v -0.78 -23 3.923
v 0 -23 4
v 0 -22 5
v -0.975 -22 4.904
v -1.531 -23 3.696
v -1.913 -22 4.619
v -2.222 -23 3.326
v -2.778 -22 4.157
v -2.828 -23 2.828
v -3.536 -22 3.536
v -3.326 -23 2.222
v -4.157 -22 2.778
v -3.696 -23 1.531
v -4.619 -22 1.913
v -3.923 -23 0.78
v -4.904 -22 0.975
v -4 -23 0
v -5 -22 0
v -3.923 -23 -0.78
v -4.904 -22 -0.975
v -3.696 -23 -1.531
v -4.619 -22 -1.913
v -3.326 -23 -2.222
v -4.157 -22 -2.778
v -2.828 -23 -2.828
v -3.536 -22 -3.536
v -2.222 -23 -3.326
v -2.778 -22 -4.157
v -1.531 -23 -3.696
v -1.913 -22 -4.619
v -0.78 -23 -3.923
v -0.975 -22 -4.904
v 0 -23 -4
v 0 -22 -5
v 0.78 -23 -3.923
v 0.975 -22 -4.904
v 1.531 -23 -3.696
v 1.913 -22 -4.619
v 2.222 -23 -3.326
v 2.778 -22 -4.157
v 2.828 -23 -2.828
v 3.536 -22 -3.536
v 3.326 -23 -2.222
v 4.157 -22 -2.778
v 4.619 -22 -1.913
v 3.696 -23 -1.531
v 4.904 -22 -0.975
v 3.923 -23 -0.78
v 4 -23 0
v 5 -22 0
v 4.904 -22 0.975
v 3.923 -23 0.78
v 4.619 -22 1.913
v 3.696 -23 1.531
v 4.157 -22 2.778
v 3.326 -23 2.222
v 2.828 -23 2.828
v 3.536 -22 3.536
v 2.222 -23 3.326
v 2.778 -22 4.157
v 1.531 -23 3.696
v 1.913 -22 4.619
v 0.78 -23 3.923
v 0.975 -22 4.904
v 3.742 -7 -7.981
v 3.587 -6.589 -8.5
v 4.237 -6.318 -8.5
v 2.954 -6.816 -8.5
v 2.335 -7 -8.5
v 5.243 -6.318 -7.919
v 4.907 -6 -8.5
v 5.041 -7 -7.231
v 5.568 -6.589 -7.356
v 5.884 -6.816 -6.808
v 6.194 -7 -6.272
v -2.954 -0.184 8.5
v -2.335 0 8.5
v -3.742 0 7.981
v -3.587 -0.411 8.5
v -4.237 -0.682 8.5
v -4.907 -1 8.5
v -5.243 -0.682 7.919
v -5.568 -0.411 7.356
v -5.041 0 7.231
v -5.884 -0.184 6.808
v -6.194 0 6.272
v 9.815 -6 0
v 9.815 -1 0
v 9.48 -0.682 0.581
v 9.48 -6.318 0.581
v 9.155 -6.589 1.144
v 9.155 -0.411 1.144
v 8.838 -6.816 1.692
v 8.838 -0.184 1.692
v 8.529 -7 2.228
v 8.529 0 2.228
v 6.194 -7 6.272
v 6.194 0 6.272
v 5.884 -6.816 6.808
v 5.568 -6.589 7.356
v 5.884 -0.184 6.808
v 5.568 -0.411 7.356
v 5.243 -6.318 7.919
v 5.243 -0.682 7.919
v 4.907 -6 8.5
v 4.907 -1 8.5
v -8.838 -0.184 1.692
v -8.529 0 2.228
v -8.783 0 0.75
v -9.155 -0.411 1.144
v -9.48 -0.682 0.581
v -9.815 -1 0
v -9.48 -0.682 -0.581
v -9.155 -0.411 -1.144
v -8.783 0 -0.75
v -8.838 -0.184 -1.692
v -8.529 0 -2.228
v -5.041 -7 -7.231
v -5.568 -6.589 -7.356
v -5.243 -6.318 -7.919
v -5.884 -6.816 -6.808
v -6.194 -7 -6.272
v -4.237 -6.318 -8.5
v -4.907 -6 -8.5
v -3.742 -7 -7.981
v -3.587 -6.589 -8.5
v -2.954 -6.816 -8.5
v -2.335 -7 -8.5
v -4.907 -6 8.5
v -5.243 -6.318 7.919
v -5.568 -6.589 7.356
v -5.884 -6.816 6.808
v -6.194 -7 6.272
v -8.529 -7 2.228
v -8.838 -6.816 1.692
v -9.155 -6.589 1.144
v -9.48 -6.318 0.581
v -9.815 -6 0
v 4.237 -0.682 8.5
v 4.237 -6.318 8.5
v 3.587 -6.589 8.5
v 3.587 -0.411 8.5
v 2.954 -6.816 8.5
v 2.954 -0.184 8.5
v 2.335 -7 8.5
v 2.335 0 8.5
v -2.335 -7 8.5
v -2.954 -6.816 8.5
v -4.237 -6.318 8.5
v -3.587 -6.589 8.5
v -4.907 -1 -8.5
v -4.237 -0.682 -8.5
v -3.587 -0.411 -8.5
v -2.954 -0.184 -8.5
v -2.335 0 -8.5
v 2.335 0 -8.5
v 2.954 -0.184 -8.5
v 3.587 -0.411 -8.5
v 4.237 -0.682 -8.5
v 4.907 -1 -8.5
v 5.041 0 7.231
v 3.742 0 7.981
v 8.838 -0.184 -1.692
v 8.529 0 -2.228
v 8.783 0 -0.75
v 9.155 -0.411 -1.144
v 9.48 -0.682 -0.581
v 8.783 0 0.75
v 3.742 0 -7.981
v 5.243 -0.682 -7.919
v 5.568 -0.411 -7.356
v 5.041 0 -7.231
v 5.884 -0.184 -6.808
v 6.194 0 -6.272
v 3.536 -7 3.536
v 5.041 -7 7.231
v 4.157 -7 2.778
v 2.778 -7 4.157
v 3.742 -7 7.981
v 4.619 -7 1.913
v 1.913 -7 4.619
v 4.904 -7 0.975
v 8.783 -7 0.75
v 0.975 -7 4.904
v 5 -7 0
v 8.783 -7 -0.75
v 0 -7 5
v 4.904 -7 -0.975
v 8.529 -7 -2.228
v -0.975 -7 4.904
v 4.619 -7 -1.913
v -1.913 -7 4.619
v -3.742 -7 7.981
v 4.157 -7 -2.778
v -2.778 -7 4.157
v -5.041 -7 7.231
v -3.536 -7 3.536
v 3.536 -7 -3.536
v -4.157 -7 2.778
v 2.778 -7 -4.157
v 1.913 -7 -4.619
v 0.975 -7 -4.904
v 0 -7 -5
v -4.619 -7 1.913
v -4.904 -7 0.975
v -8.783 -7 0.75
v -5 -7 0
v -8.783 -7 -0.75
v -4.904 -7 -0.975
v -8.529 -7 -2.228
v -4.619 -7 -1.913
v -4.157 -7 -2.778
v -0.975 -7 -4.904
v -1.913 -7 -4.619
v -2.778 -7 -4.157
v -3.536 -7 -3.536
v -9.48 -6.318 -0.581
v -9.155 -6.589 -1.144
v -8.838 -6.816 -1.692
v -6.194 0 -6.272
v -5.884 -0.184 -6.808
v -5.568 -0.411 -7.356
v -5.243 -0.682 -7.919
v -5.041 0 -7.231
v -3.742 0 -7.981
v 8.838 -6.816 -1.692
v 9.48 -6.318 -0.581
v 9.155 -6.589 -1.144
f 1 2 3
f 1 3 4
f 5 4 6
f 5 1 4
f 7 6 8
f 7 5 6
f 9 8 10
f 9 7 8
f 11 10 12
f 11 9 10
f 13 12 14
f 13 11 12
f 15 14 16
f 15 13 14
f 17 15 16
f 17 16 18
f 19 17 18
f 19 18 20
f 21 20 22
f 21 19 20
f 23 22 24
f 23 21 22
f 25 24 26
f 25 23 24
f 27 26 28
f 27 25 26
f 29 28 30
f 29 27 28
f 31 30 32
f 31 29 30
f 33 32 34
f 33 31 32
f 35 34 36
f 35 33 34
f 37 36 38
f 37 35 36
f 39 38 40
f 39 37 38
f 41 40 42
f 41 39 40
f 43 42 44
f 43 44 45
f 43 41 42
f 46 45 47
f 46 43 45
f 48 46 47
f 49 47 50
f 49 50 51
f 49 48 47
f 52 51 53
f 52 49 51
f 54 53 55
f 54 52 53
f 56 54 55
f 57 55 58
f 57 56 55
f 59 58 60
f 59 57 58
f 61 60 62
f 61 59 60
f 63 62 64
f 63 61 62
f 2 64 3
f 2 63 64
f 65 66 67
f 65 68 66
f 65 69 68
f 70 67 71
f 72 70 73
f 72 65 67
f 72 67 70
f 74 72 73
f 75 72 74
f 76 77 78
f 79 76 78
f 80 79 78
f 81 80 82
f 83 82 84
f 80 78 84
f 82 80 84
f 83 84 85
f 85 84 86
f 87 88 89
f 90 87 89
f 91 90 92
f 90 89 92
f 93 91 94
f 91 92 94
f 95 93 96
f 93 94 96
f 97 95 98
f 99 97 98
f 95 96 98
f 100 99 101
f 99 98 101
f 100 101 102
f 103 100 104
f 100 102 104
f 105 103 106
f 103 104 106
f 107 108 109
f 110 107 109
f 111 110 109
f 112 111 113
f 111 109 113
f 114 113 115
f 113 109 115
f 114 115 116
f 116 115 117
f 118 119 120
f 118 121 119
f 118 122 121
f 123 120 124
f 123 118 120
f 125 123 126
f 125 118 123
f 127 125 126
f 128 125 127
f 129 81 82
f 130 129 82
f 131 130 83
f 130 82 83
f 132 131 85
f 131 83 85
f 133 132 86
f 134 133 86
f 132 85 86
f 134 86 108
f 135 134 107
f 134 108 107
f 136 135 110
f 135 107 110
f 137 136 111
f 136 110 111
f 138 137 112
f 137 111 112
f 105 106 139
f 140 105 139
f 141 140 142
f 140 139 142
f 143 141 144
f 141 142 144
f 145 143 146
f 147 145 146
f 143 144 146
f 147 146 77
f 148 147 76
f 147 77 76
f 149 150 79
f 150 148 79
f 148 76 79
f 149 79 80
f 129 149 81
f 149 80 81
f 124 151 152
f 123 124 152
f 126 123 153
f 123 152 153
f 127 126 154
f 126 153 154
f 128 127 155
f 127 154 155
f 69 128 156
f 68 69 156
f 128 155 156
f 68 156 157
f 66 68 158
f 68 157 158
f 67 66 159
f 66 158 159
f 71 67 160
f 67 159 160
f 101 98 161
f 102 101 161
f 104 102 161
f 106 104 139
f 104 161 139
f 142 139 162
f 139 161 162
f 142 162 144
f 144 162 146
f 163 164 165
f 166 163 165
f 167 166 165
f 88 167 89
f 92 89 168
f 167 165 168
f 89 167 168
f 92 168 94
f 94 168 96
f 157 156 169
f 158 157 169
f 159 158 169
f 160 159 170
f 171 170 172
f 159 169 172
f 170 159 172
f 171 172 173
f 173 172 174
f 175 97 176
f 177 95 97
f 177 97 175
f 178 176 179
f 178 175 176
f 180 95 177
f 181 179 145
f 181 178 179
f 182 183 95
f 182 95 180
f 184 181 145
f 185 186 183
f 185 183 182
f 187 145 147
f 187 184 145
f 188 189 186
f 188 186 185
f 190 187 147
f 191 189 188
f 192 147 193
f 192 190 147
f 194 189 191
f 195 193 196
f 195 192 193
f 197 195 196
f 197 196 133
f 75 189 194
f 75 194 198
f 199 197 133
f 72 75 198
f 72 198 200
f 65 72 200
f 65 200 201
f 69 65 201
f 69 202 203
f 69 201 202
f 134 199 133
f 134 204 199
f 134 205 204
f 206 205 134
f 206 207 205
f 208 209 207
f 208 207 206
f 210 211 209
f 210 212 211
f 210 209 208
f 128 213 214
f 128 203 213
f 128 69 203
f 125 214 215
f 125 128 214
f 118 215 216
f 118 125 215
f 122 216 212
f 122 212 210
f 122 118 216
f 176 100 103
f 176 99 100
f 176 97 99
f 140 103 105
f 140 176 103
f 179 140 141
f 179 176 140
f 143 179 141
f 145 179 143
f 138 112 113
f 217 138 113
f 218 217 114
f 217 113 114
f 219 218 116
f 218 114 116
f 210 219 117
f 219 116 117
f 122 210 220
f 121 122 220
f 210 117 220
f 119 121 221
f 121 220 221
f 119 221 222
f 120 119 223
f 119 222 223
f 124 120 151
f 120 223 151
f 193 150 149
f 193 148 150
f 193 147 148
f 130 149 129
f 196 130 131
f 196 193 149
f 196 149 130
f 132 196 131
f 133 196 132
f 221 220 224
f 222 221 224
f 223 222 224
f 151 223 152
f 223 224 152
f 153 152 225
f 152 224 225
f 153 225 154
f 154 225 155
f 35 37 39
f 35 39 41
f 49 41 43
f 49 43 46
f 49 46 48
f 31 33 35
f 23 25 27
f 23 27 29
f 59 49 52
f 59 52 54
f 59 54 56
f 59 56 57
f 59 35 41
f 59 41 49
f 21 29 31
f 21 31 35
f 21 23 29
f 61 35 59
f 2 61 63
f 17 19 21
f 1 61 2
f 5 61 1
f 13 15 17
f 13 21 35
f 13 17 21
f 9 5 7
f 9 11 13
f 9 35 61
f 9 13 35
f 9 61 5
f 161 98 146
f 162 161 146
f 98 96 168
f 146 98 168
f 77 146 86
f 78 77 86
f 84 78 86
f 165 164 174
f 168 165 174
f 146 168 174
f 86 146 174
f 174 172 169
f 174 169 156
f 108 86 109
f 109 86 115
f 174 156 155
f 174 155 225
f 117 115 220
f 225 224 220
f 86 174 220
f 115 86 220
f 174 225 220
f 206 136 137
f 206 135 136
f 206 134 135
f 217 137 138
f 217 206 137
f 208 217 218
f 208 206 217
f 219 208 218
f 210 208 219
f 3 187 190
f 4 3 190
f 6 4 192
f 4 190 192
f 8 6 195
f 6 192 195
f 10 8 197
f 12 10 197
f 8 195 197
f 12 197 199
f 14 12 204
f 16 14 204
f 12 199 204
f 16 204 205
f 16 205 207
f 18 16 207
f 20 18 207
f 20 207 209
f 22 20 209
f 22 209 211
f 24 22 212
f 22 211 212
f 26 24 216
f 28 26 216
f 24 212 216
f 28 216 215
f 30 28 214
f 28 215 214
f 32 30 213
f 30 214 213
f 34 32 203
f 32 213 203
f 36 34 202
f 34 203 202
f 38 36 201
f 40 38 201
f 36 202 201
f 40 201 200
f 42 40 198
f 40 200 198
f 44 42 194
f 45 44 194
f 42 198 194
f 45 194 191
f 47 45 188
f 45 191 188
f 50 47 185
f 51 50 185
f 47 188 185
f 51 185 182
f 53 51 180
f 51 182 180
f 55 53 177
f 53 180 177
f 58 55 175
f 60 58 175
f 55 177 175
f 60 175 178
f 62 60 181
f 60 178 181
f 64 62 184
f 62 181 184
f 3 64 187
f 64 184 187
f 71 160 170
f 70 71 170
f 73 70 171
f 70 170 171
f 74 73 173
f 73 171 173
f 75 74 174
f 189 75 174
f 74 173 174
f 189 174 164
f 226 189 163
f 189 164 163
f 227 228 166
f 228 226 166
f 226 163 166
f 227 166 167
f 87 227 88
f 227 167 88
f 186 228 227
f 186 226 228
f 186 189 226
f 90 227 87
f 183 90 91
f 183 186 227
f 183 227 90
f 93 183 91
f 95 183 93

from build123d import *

# Parameters (mm, degrees)
EXTRUDE_1_DEPTH = 7
SKETCH_5_R      = 5
EXTRUDE_2_DEPTH = 16
CHAMFER_1_SIZE  = 1


with BuildPart() as part:
    # Эскиз1 → Вытянуть1 (new body)
    with BuildSketch(Plane(origin=(0, 0, 0), x_dir=(1, 0, 0), z_dir=(0, 1, 0))):
        Polygon((-9.814954576, 0), (-4.907477288, 8.5), (4.907477288, 8.5), (9.814954576, 0), align=None)
        Polygon((-9.814954576, 0), (9.814954576, 0), (4.907477288, -8.5), (-4.907477288, -8.5), align=None)
    extrude(amount=-EXTRUDE_1_DEPTH)

    # Эскиз5 → Вытянуть2 (add)
    with BuildSketch(Plane.XZ.offset(7)):
        with Locations(Location((0, 0, 0), (0, 0, 90))):
            Circle(SKETCH_5_R)
    extrude(amount=EXTRUDE_2_DEPTH)

    # Эскиз4 → Вырез-Повернуть1 (revolve, cut)
    with BuildSketch(Plane.XY):
        Polygon((-9.814954576, -1), (-8.814954576, 0), (-9.814954576, 0), align=None)
        Polygon((-9.814954576, -6), (-8.814954576, -7), (-9.814954576, -7), align=None)
    revolve(axis=Axis((0, -7, 0), (0, -1, 0)), mode=Mode.SUBTRACT)

    # Фаска1
    chamfer_1_edges = [part.edges().sort_by_distance(p)[0] for p in [
        (0, -23, -5),
    ]]
    chamfer(chamfer_1_edges, length=CHAMFER_1_SIZE)


solid = part.part
